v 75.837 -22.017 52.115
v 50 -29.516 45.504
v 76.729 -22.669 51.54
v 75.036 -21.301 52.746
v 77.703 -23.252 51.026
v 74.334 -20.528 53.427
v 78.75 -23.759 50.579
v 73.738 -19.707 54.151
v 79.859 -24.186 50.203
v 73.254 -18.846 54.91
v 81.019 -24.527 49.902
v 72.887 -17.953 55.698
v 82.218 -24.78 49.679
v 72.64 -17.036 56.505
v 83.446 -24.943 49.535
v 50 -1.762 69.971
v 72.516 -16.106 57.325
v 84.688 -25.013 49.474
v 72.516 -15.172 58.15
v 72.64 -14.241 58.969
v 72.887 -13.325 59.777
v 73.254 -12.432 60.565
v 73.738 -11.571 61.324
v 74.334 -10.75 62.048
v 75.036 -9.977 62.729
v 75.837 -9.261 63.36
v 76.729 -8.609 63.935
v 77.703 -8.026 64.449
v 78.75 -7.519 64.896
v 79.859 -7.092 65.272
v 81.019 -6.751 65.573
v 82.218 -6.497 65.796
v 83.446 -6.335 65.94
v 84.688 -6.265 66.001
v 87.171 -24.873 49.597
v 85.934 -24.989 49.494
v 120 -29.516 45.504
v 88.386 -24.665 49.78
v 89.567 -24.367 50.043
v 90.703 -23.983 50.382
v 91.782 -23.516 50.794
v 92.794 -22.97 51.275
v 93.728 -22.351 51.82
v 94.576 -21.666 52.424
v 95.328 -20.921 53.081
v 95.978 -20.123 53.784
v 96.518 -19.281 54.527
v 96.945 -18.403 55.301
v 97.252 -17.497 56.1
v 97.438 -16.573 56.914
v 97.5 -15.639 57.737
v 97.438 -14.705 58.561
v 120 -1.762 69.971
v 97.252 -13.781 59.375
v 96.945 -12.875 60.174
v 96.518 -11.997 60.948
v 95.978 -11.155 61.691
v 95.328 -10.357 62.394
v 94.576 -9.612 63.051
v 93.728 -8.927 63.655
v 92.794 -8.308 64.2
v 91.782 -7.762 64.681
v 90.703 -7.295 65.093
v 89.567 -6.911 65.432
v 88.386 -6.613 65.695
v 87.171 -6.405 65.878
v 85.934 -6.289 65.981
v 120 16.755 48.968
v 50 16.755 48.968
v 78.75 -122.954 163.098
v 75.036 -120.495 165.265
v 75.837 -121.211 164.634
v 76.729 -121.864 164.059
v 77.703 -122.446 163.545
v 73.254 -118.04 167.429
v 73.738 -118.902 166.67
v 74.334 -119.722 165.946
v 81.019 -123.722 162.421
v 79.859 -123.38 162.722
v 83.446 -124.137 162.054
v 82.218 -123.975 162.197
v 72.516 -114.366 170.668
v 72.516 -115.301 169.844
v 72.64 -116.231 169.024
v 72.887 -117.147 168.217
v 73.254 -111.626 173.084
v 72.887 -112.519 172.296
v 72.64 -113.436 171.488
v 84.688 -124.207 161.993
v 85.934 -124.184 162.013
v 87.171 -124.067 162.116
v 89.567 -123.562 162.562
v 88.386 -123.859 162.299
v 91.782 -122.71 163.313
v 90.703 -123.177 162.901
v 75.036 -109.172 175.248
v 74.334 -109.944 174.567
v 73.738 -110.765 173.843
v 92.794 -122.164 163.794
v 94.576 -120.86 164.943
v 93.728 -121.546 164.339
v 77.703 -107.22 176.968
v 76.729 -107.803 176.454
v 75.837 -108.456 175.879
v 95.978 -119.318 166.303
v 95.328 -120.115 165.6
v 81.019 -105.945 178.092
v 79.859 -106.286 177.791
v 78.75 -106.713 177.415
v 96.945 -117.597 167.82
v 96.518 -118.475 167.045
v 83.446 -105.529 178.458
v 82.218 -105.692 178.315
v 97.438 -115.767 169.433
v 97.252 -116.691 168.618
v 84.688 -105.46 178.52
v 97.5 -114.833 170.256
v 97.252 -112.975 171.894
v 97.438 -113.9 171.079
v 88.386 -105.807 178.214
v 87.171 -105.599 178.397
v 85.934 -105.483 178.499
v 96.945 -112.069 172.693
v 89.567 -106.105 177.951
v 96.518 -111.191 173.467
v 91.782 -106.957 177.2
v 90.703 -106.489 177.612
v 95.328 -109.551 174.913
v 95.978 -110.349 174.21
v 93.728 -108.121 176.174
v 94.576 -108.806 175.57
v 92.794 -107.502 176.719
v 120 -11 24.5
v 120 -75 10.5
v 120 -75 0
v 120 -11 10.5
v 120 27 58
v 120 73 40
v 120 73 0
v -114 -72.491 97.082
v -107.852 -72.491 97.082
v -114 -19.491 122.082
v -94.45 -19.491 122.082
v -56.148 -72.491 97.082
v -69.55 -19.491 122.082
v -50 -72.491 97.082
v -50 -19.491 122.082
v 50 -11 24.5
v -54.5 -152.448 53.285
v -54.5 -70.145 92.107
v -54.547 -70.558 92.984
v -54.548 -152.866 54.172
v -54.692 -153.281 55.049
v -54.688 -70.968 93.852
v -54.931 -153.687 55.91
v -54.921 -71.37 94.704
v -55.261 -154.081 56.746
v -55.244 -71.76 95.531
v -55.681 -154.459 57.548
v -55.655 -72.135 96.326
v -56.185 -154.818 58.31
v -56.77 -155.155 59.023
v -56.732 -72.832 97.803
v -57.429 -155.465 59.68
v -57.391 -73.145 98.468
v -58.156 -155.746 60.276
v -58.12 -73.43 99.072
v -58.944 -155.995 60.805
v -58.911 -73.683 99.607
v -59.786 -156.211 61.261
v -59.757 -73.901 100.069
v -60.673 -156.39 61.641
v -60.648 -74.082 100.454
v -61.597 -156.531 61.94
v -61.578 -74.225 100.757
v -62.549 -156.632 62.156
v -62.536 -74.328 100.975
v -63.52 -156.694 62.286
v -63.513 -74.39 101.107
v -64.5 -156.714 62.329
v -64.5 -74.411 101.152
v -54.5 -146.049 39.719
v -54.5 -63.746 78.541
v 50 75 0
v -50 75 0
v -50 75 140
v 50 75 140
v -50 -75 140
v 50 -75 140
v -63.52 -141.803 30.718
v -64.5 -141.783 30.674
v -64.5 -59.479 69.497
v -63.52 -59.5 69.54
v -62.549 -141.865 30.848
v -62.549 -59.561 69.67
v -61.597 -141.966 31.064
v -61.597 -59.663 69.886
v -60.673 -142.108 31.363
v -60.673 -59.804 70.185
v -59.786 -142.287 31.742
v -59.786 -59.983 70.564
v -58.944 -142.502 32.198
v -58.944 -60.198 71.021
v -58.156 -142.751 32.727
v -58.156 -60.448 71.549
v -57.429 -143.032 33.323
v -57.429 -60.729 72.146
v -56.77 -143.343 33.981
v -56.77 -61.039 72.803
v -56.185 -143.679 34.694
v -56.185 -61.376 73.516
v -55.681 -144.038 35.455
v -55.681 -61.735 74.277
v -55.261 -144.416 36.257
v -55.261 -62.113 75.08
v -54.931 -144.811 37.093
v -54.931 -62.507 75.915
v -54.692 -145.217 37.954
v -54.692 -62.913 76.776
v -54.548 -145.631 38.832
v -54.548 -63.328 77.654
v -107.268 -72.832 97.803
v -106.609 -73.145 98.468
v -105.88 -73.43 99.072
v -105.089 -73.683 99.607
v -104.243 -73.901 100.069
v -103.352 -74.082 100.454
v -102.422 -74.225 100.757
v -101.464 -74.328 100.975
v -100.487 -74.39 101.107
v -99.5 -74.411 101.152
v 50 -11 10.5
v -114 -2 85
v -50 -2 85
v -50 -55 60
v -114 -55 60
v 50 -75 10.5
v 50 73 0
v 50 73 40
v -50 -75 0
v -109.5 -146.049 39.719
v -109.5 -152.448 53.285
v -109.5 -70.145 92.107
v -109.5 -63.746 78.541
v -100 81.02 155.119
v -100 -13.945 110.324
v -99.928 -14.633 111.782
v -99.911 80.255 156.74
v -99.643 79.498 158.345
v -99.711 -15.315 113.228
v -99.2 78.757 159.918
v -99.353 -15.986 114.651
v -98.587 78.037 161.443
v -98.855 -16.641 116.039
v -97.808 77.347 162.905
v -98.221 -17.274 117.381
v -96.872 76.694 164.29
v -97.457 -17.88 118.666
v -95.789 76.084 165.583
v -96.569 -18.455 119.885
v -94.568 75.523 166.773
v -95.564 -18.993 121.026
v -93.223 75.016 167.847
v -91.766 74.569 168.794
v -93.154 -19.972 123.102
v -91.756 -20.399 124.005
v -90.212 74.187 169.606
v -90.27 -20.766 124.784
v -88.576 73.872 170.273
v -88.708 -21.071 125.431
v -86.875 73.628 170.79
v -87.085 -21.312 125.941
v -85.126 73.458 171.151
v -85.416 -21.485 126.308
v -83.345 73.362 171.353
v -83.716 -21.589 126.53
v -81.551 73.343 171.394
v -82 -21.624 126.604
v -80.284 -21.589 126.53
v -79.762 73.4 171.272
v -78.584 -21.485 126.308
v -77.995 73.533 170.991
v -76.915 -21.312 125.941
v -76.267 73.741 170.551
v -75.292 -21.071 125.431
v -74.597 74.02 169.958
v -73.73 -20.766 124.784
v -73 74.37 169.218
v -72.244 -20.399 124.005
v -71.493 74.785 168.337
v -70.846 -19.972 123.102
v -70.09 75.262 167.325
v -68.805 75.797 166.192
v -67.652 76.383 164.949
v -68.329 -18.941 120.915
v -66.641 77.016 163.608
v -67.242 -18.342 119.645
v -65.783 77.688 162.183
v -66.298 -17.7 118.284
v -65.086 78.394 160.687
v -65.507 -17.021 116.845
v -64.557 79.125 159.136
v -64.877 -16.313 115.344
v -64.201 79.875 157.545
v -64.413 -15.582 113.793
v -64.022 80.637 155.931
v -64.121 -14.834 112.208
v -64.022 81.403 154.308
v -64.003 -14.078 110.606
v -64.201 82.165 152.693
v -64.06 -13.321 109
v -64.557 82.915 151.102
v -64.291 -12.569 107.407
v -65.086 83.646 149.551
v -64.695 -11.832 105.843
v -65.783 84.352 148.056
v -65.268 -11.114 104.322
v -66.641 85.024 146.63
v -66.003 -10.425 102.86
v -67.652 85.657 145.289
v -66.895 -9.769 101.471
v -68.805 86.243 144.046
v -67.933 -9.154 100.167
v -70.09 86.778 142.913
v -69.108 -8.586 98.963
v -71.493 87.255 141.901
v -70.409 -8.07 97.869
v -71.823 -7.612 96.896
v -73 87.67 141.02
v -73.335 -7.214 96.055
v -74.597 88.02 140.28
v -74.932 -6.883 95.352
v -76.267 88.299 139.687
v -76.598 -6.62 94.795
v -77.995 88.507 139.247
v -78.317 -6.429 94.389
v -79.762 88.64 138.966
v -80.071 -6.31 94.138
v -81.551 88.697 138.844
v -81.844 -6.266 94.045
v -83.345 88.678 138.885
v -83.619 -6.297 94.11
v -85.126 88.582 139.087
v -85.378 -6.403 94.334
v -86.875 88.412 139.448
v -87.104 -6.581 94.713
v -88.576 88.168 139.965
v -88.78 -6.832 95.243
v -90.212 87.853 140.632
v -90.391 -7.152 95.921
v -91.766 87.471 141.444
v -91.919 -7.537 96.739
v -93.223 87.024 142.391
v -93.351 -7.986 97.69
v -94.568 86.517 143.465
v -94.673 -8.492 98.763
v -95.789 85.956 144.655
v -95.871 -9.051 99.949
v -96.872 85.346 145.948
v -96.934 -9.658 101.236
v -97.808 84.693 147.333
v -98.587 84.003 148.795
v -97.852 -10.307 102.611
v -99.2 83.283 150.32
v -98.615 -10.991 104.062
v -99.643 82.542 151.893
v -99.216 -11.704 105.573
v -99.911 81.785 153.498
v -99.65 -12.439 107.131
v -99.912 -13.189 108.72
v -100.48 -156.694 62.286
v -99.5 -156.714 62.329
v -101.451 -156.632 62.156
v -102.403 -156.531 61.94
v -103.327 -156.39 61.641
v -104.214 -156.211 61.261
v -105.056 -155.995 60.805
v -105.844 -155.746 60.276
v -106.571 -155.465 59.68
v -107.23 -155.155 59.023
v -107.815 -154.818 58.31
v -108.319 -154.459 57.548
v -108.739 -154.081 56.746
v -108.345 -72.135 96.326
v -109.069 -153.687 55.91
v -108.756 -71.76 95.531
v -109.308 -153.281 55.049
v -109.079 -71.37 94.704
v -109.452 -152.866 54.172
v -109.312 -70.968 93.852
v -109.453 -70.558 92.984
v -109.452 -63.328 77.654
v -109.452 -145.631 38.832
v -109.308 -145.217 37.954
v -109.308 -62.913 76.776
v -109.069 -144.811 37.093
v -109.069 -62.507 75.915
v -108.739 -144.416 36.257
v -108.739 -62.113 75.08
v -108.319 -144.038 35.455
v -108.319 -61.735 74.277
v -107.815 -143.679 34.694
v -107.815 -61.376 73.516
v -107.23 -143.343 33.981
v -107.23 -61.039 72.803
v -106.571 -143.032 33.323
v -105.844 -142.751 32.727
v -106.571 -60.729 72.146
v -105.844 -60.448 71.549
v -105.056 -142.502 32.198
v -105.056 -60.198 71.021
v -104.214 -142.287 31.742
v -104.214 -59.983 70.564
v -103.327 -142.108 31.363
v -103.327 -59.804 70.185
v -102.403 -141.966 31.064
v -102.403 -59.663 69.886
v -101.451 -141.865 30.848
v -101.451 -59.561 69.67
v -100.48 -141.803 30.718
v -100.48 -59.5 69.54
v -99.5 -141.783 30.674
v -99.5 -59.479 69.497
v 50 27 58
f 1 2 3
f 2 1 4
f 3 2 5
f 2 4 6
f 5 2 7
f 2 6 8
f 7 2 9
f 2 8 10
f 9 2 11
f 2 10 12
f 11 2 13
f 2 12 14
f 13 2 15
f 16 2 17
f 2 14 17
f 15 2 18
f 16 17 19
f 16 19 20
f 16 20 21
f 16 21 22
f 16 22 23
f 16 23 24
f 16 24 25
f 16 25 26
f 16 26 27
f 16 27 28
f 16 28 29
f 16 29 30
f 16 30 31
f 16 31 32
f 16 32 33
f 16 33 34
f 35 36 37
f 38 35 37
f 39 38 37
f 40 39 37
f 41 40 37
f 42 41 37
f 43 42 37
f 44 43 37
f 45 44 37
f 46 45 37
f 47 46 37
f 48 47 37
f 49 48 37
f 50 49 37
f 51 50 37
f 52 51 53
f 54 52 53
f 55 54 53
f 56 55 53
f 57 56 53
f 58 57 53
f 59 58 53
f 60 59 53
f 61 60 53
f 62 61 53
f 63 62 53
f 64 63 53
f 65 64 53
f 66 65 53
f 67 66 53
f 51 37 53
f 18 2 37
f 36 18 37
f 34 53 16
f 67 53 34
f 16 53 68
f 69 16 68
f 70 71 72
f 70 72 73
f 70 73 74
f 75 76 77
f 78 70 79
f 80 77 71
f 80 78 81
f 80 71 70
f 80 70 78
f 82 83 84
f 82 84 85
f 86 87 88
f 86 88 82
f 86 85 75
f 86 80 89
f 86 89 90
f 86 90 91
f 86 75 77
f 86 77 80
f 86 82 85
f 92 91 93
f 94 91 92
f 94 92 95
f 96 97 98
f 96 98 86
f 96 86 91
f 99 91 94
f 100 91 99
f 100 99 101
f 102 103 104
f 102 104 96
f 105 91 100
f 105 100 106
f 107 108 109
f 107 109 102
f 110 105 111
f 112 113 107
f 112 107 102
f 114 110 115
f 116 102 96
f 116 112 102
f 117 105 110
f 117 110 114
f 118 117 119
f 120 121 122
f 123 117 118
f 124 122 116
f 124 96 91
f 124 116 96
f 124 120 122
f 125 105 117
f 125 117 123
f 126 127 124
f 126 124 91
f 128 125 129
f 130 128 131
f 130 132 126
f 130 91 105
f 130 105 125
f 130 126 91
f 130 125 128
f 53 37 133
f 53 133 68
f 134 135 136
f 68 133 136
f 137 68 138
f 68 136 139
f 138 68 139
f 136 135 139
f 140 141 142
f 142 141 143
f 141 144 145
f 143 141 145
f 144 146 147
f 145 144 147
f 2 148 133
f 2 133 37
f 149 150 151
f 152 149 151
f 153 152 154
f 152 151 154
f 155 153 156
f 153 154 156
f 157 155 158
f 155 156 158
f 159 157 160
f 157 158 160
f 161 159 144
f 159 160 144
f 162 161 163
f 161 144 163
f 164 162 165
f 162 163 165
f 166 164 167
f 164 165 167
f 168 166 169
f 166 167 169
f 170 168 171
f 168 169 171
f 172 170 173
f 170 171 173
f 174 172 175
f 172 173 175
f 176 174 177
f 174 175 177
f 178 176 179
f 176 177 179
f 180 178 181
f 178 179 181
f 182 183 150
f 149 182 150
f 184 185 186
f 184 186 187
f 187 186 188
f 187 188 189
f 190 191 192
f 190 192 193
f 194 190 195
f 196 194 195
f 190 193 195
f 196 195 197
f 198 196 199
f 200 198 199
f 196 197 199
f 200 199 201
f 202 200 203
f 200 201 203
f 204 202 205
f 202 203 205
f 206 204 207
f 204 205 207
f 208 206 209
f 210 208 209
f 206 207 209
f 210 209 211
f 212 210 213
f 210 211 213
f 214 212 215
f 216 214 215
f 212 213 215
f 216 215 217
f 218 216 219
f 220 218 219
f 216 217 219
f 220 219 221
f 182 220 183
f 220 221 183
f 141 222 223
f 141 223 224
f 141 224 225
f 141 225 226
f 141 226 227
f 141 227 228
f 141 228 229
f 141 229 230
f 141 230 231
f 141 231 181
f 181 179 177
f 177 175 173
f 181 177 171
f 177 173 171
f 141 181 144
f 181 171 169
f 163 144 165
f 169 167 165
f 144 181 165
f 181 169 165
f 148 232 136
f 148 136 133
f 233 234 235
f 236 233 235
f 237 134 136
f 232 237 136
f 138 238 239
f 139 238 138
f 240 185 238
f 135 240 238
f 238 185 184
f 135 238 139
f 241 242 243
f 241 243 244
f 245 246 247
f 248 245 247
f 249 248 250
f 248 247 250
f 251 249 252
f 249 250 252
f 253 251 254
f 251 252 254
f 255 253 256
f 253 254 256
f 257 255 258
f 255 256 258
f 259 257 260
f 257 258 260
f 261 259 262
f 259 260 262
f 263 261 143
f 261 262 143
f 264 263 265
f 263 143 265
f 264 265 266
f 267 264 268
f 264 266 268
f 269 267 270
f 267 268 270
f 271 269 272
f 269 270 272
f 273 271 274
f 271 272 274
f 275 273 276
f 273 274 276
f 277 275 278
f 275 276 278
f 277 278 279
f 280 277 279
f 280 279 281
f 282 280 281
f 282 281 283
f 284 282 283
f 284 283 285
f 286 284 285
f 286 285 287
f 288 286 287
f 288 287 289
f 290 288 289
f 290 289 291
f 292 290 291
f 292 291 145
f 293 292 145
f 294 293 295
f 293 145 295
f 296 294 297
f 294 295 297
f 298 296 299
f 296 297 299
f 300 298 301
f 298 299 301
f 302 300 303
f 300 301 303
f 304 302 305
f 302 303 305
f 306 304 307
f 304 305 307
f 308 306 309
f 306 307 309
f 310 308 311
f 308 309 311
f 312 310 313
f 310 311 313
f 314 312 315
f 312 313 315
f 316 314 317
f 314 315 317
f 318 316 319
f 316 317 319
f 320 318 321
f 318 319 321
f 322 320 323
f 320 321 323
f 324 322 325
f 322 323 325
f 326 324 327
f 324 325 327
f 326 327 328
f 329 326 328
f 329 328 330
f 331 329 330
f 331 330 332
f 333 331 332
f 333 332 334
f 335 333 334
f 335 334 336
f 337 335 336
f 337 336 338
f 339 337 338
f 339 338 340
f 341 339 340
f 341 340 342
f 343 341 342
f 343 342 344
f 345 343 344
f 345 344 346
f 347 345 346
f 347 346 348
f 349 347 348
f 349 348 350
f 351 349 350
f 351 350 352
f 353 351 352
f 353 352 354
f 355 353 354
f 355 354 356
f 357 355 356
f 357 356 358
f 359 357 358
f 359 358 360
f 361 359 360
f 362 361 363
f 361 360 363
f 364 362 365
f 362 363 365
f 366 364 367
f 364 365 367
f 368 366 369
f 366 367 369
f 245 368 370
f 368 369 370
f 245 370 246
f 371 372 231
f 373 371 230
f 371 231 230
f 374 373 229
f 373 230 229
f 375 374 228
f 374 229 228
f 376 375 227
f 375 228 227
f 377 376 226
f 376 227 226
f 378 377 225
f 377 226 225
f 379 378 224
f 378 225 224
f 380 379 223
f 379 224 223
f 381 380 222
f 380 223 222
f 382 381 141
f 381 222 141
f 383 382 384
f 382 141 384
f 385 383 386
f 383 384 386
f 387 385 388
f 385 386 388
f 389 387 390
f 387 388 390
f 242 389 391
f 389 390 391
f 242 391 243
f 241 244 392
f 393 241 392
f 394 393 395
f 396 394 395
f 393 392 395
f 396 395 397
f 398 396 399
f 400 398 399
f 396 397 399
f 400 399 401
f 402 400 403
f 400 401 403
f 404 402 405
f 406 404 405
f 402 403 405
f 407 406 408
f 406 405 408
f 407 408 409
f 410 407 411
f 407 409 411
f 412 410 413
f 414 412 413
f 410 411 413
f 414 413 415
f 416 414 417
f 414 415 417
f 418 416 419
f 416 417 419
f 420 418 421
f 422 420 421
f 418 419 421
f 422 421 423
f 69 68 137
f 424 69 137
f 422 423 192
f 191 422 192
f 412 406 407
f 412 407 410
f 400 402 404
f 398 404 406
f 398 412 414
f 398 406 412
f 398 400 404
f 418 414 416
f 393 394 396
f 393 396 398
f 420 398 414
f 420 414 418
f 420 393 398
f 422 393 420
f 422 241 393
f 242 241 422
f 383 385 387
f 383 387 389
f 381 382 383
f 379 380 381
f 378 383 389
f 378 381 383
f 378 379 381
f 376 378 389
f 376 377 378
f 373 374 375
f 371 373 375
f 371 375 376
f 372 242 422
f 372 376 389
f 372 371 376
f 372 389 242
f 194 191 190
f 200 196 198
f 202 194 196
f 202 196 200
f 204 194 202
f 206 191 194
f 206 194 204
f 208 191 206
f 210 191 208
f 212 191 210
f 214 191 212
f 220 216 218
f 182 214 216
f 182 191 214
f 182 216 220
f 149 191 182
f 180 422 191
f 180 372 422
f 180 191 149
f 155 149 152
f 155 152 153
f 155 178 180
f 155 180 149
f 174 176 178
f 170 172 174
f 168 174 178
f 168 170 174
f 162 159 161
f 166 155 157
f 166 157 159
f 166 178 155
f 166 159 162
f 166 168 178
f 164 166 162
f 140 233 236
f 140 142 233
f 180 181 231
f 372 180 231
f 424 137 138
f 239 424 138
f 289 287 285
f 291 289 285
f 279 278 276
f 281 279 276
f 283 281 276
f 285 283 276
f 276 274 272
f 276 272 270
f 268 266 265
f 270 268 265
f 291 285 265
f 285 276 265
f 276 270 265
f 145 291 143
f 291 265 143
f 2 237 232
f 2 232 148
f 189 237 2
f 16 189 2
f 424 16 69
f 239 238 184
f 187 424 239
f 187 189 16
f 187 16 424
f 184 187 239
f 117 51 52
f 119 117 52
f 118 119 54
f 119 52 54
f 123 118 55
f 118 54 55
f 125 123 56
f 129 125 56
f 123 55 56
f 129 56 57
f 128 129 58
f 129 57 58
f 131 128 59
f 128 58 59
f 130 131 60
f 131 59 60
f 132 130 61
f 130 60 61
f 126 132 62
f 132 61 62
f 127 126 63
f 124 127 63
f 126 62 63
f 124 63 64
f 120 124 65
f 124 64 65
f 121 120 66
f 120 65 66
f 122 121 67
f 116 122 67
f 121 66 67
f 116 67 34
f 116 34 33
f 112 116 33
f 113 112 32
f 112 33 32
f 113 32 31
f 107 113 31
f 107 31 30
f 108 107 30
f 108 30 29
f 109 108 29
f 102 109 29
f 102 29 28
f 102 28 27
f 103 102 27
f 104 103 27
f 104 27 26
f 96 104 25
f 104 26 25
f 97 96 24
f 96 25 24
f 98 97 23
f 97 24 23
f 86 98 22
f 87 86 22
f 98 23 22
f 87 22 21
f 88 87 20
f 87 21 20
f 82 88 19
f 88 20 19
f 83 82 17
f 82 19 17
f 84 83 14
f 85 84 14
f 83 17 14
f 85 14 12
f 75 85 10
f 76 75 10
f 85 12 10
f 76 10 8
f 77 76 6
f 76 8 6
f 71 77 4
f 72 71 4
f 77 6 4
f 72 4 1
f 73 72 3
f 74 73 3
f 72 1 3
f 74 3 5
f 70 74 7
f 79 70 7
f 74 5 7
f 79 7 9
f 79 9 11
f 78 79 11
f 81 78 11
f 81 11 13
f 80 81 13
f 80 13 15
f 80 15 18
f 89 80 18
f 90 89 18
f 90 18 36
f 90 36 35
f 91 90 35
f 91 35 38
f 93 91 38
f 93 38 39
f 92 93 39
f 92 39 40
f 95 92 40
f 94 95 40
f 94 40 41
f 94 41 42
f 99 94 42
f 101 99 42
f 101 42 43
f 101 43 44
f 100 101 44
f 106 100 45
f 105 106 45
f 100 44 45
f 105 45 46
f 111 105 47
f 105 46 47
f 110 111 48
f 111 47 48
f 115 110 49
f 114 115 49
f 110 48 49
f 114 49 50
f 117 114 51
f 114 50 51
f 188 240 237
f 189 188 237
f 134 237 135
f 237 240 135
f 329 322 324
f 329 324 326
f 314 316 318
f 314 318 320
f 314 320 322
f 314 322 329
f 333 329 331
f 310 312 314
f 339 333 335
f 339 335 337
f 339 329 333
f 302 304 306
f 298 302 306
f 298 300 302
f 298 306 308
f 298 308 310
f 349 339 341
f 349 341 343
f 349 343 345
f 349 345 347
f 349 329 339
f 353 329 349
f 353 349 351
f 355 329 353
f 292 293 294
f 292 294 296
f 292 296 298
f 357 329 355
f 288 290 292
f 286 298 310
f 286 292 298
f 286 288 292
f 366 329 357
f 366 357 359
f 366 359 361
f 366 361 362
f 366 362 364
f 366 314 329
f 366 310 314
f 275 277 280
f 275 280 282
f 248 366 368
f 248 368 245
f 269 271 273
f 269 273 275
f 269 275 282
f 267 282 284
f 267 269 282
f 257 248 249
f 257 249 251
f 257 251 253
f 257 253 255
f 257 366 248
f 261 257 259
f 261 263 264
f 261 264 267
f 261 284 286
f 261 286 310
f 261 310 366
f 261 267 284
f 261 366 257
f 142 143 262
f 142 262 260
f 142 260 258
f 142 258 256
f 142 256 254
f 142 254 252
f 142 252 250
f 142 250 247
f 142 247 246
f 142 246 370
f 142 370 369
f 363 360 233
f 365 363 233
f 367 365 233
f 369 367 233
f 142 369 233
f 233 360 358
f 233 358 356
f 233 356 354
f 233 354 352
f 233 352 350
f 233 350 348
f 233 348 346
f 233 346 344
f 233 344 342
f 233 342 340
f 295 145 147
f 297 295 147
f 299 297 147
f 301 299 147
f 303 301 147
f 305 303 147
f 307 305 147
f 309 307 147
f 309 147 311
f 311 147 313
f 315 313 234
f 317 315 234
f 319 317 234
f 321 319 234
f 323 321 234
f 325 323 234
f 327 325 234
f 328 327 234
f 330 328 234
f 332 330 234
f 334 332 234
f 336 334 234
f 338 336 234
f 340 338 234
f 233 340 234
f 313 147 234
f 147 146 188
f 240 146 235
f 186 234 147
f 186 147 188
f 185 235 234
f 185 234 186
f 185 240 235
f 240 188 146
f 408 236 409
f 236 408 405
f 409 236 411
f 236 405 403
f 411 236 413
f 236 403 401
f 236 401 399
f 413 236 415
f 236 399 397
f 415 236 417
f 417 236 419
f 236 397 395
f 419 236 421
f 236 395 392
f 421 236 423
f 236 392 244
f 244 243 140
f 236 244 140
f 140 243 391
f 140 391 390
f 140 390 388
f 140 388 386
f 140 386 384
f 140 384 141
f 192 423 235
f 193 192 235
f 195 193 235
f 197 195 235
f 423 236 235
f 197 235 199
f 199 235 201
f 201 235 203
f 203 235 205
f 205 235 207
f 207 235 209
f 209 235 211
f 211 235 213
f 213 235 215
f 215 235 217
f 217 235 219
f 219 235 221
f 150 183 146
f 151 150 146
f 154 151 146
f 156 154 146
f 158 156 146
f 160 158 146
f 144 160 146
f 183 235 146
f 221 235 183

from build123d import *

# Parameters (mm, degrees)
F0_W      = 100
F0_H      = 150
F1_DEPTH  = 140
F2_W      = 70
F2_H      = 148
F3_DEPTH  = 85
F5_DEPTH  = 70
F6_R      = 12.5
F7_DEPTH  = 150
F9_DEPTH  = 64
F10_R     = 18
F11_DEPTH = 105
F13_DEPTH = 91


with BuildPart() as f1:
    # F0 (on Top) → F1 (new body)
    with BuildSketch(Plane.XY):
        Rectangle(F0_W, F0_H)
    extrude(amount=F1_DEPTH)

    # F2 (on Top) → F3 (join)
    with BuildSketch(Plane.XY):
        with Locations((85, -1)):
            Rectangle(F2_W, F2_H)
    extrude(amount=F3_DEPTH)

    # F4 (on face) → F5 (cut, through all)
    with BuildSketch(Plane.YZ.offset(120)):
        Polygon((27, 58), (73, 40), (73, 85), (-75, 85), (-75, 10.5), (-11, 10.5), (-11, 24.5), (-29.5162637007, 45.5035230037), (-1.7616083029, 69.9714428939), (16.7546553978, 48.9679198901), align=None)
    extrude(amount=-F5_DEPTH, mode=Mode.SUBTRACT)

    # F6 (on face) → F7 (join)
    with BuildSketch(Plane(origin=(0, -35.4800240514, 40.2459974314), x_dir=(1, 0, 0), z_dir=(0, -0.6612951322, 0.7501258216))):
        with Locations((85, 26.4503467009)):
            Circle(F6_R)
    extrude(amount=F7_DEPTH)

    # F8 (on face) → F9 (join)
    with BuildSketch(Plane(origin=(-50, 0, 0), x_dir=(0, -1, 0), z_dir=(-1, 0, 0))):
        Polygon((2, 85), (55, 60), (72.4913657042, 97.081695293), (19.4913657042, 122.081695293), align=None)
    extrude(amount=F9_DEPTH)

    # F10 (on face) → F11 (join)
    with BuildSketch(Plane(origin=(0, 31.1610366919, 14.6986022132), x_dir=(-1, 0, 0), z_dir=(0, 0.9044315925, 0.4266186757))):
        with Locations((82, 105.7299227149)):
            Circle(F10_R)
    extrude(amount=F11_DEPTH)

    # F12 (on face) → F13 (join)
    with BuildSketch(Plane(origin=(0, -21.8389633081, -10.3013977868), x_dir=(1, 0, 0), z_dir=(0, -0.9044315925, -0.4266186757))):
        with BuildLine():
            ThreePointArc((-109.5, 98.2299227149), (-106.5710678119, 91.158854903), (-99.5, 88.2299227149))
            Line((-99.5, 88.2299227149), (-64.5, 88.2299227149))
            ThreePointArc((-64.5, 88.2299227149), (-57.4289321881, 91.158854903), (-54.5, 98.2299227149))
            Line((-54.5, 98.2299227149), (-54.5, 113.2299227149))
            ThreePointArc((-54.5, 113.2299227149), (-57.4289321881, 120.3009905268), (-64.5, 123.2299227149))
            Line((-64.5, 123.2299227149), (-99.5, 123.2299227149))
            ThreePointArc((-99.5, 123.2299227149), (-106.5710678119, 120.3009905268), (-109.5, 113.2299227149))
            Line((-109.5, 113.2299227149), (-109.5, 98.2299227149))
        make_face()
    extrude(amount=F13_DEPTH)


solid = f1.part
